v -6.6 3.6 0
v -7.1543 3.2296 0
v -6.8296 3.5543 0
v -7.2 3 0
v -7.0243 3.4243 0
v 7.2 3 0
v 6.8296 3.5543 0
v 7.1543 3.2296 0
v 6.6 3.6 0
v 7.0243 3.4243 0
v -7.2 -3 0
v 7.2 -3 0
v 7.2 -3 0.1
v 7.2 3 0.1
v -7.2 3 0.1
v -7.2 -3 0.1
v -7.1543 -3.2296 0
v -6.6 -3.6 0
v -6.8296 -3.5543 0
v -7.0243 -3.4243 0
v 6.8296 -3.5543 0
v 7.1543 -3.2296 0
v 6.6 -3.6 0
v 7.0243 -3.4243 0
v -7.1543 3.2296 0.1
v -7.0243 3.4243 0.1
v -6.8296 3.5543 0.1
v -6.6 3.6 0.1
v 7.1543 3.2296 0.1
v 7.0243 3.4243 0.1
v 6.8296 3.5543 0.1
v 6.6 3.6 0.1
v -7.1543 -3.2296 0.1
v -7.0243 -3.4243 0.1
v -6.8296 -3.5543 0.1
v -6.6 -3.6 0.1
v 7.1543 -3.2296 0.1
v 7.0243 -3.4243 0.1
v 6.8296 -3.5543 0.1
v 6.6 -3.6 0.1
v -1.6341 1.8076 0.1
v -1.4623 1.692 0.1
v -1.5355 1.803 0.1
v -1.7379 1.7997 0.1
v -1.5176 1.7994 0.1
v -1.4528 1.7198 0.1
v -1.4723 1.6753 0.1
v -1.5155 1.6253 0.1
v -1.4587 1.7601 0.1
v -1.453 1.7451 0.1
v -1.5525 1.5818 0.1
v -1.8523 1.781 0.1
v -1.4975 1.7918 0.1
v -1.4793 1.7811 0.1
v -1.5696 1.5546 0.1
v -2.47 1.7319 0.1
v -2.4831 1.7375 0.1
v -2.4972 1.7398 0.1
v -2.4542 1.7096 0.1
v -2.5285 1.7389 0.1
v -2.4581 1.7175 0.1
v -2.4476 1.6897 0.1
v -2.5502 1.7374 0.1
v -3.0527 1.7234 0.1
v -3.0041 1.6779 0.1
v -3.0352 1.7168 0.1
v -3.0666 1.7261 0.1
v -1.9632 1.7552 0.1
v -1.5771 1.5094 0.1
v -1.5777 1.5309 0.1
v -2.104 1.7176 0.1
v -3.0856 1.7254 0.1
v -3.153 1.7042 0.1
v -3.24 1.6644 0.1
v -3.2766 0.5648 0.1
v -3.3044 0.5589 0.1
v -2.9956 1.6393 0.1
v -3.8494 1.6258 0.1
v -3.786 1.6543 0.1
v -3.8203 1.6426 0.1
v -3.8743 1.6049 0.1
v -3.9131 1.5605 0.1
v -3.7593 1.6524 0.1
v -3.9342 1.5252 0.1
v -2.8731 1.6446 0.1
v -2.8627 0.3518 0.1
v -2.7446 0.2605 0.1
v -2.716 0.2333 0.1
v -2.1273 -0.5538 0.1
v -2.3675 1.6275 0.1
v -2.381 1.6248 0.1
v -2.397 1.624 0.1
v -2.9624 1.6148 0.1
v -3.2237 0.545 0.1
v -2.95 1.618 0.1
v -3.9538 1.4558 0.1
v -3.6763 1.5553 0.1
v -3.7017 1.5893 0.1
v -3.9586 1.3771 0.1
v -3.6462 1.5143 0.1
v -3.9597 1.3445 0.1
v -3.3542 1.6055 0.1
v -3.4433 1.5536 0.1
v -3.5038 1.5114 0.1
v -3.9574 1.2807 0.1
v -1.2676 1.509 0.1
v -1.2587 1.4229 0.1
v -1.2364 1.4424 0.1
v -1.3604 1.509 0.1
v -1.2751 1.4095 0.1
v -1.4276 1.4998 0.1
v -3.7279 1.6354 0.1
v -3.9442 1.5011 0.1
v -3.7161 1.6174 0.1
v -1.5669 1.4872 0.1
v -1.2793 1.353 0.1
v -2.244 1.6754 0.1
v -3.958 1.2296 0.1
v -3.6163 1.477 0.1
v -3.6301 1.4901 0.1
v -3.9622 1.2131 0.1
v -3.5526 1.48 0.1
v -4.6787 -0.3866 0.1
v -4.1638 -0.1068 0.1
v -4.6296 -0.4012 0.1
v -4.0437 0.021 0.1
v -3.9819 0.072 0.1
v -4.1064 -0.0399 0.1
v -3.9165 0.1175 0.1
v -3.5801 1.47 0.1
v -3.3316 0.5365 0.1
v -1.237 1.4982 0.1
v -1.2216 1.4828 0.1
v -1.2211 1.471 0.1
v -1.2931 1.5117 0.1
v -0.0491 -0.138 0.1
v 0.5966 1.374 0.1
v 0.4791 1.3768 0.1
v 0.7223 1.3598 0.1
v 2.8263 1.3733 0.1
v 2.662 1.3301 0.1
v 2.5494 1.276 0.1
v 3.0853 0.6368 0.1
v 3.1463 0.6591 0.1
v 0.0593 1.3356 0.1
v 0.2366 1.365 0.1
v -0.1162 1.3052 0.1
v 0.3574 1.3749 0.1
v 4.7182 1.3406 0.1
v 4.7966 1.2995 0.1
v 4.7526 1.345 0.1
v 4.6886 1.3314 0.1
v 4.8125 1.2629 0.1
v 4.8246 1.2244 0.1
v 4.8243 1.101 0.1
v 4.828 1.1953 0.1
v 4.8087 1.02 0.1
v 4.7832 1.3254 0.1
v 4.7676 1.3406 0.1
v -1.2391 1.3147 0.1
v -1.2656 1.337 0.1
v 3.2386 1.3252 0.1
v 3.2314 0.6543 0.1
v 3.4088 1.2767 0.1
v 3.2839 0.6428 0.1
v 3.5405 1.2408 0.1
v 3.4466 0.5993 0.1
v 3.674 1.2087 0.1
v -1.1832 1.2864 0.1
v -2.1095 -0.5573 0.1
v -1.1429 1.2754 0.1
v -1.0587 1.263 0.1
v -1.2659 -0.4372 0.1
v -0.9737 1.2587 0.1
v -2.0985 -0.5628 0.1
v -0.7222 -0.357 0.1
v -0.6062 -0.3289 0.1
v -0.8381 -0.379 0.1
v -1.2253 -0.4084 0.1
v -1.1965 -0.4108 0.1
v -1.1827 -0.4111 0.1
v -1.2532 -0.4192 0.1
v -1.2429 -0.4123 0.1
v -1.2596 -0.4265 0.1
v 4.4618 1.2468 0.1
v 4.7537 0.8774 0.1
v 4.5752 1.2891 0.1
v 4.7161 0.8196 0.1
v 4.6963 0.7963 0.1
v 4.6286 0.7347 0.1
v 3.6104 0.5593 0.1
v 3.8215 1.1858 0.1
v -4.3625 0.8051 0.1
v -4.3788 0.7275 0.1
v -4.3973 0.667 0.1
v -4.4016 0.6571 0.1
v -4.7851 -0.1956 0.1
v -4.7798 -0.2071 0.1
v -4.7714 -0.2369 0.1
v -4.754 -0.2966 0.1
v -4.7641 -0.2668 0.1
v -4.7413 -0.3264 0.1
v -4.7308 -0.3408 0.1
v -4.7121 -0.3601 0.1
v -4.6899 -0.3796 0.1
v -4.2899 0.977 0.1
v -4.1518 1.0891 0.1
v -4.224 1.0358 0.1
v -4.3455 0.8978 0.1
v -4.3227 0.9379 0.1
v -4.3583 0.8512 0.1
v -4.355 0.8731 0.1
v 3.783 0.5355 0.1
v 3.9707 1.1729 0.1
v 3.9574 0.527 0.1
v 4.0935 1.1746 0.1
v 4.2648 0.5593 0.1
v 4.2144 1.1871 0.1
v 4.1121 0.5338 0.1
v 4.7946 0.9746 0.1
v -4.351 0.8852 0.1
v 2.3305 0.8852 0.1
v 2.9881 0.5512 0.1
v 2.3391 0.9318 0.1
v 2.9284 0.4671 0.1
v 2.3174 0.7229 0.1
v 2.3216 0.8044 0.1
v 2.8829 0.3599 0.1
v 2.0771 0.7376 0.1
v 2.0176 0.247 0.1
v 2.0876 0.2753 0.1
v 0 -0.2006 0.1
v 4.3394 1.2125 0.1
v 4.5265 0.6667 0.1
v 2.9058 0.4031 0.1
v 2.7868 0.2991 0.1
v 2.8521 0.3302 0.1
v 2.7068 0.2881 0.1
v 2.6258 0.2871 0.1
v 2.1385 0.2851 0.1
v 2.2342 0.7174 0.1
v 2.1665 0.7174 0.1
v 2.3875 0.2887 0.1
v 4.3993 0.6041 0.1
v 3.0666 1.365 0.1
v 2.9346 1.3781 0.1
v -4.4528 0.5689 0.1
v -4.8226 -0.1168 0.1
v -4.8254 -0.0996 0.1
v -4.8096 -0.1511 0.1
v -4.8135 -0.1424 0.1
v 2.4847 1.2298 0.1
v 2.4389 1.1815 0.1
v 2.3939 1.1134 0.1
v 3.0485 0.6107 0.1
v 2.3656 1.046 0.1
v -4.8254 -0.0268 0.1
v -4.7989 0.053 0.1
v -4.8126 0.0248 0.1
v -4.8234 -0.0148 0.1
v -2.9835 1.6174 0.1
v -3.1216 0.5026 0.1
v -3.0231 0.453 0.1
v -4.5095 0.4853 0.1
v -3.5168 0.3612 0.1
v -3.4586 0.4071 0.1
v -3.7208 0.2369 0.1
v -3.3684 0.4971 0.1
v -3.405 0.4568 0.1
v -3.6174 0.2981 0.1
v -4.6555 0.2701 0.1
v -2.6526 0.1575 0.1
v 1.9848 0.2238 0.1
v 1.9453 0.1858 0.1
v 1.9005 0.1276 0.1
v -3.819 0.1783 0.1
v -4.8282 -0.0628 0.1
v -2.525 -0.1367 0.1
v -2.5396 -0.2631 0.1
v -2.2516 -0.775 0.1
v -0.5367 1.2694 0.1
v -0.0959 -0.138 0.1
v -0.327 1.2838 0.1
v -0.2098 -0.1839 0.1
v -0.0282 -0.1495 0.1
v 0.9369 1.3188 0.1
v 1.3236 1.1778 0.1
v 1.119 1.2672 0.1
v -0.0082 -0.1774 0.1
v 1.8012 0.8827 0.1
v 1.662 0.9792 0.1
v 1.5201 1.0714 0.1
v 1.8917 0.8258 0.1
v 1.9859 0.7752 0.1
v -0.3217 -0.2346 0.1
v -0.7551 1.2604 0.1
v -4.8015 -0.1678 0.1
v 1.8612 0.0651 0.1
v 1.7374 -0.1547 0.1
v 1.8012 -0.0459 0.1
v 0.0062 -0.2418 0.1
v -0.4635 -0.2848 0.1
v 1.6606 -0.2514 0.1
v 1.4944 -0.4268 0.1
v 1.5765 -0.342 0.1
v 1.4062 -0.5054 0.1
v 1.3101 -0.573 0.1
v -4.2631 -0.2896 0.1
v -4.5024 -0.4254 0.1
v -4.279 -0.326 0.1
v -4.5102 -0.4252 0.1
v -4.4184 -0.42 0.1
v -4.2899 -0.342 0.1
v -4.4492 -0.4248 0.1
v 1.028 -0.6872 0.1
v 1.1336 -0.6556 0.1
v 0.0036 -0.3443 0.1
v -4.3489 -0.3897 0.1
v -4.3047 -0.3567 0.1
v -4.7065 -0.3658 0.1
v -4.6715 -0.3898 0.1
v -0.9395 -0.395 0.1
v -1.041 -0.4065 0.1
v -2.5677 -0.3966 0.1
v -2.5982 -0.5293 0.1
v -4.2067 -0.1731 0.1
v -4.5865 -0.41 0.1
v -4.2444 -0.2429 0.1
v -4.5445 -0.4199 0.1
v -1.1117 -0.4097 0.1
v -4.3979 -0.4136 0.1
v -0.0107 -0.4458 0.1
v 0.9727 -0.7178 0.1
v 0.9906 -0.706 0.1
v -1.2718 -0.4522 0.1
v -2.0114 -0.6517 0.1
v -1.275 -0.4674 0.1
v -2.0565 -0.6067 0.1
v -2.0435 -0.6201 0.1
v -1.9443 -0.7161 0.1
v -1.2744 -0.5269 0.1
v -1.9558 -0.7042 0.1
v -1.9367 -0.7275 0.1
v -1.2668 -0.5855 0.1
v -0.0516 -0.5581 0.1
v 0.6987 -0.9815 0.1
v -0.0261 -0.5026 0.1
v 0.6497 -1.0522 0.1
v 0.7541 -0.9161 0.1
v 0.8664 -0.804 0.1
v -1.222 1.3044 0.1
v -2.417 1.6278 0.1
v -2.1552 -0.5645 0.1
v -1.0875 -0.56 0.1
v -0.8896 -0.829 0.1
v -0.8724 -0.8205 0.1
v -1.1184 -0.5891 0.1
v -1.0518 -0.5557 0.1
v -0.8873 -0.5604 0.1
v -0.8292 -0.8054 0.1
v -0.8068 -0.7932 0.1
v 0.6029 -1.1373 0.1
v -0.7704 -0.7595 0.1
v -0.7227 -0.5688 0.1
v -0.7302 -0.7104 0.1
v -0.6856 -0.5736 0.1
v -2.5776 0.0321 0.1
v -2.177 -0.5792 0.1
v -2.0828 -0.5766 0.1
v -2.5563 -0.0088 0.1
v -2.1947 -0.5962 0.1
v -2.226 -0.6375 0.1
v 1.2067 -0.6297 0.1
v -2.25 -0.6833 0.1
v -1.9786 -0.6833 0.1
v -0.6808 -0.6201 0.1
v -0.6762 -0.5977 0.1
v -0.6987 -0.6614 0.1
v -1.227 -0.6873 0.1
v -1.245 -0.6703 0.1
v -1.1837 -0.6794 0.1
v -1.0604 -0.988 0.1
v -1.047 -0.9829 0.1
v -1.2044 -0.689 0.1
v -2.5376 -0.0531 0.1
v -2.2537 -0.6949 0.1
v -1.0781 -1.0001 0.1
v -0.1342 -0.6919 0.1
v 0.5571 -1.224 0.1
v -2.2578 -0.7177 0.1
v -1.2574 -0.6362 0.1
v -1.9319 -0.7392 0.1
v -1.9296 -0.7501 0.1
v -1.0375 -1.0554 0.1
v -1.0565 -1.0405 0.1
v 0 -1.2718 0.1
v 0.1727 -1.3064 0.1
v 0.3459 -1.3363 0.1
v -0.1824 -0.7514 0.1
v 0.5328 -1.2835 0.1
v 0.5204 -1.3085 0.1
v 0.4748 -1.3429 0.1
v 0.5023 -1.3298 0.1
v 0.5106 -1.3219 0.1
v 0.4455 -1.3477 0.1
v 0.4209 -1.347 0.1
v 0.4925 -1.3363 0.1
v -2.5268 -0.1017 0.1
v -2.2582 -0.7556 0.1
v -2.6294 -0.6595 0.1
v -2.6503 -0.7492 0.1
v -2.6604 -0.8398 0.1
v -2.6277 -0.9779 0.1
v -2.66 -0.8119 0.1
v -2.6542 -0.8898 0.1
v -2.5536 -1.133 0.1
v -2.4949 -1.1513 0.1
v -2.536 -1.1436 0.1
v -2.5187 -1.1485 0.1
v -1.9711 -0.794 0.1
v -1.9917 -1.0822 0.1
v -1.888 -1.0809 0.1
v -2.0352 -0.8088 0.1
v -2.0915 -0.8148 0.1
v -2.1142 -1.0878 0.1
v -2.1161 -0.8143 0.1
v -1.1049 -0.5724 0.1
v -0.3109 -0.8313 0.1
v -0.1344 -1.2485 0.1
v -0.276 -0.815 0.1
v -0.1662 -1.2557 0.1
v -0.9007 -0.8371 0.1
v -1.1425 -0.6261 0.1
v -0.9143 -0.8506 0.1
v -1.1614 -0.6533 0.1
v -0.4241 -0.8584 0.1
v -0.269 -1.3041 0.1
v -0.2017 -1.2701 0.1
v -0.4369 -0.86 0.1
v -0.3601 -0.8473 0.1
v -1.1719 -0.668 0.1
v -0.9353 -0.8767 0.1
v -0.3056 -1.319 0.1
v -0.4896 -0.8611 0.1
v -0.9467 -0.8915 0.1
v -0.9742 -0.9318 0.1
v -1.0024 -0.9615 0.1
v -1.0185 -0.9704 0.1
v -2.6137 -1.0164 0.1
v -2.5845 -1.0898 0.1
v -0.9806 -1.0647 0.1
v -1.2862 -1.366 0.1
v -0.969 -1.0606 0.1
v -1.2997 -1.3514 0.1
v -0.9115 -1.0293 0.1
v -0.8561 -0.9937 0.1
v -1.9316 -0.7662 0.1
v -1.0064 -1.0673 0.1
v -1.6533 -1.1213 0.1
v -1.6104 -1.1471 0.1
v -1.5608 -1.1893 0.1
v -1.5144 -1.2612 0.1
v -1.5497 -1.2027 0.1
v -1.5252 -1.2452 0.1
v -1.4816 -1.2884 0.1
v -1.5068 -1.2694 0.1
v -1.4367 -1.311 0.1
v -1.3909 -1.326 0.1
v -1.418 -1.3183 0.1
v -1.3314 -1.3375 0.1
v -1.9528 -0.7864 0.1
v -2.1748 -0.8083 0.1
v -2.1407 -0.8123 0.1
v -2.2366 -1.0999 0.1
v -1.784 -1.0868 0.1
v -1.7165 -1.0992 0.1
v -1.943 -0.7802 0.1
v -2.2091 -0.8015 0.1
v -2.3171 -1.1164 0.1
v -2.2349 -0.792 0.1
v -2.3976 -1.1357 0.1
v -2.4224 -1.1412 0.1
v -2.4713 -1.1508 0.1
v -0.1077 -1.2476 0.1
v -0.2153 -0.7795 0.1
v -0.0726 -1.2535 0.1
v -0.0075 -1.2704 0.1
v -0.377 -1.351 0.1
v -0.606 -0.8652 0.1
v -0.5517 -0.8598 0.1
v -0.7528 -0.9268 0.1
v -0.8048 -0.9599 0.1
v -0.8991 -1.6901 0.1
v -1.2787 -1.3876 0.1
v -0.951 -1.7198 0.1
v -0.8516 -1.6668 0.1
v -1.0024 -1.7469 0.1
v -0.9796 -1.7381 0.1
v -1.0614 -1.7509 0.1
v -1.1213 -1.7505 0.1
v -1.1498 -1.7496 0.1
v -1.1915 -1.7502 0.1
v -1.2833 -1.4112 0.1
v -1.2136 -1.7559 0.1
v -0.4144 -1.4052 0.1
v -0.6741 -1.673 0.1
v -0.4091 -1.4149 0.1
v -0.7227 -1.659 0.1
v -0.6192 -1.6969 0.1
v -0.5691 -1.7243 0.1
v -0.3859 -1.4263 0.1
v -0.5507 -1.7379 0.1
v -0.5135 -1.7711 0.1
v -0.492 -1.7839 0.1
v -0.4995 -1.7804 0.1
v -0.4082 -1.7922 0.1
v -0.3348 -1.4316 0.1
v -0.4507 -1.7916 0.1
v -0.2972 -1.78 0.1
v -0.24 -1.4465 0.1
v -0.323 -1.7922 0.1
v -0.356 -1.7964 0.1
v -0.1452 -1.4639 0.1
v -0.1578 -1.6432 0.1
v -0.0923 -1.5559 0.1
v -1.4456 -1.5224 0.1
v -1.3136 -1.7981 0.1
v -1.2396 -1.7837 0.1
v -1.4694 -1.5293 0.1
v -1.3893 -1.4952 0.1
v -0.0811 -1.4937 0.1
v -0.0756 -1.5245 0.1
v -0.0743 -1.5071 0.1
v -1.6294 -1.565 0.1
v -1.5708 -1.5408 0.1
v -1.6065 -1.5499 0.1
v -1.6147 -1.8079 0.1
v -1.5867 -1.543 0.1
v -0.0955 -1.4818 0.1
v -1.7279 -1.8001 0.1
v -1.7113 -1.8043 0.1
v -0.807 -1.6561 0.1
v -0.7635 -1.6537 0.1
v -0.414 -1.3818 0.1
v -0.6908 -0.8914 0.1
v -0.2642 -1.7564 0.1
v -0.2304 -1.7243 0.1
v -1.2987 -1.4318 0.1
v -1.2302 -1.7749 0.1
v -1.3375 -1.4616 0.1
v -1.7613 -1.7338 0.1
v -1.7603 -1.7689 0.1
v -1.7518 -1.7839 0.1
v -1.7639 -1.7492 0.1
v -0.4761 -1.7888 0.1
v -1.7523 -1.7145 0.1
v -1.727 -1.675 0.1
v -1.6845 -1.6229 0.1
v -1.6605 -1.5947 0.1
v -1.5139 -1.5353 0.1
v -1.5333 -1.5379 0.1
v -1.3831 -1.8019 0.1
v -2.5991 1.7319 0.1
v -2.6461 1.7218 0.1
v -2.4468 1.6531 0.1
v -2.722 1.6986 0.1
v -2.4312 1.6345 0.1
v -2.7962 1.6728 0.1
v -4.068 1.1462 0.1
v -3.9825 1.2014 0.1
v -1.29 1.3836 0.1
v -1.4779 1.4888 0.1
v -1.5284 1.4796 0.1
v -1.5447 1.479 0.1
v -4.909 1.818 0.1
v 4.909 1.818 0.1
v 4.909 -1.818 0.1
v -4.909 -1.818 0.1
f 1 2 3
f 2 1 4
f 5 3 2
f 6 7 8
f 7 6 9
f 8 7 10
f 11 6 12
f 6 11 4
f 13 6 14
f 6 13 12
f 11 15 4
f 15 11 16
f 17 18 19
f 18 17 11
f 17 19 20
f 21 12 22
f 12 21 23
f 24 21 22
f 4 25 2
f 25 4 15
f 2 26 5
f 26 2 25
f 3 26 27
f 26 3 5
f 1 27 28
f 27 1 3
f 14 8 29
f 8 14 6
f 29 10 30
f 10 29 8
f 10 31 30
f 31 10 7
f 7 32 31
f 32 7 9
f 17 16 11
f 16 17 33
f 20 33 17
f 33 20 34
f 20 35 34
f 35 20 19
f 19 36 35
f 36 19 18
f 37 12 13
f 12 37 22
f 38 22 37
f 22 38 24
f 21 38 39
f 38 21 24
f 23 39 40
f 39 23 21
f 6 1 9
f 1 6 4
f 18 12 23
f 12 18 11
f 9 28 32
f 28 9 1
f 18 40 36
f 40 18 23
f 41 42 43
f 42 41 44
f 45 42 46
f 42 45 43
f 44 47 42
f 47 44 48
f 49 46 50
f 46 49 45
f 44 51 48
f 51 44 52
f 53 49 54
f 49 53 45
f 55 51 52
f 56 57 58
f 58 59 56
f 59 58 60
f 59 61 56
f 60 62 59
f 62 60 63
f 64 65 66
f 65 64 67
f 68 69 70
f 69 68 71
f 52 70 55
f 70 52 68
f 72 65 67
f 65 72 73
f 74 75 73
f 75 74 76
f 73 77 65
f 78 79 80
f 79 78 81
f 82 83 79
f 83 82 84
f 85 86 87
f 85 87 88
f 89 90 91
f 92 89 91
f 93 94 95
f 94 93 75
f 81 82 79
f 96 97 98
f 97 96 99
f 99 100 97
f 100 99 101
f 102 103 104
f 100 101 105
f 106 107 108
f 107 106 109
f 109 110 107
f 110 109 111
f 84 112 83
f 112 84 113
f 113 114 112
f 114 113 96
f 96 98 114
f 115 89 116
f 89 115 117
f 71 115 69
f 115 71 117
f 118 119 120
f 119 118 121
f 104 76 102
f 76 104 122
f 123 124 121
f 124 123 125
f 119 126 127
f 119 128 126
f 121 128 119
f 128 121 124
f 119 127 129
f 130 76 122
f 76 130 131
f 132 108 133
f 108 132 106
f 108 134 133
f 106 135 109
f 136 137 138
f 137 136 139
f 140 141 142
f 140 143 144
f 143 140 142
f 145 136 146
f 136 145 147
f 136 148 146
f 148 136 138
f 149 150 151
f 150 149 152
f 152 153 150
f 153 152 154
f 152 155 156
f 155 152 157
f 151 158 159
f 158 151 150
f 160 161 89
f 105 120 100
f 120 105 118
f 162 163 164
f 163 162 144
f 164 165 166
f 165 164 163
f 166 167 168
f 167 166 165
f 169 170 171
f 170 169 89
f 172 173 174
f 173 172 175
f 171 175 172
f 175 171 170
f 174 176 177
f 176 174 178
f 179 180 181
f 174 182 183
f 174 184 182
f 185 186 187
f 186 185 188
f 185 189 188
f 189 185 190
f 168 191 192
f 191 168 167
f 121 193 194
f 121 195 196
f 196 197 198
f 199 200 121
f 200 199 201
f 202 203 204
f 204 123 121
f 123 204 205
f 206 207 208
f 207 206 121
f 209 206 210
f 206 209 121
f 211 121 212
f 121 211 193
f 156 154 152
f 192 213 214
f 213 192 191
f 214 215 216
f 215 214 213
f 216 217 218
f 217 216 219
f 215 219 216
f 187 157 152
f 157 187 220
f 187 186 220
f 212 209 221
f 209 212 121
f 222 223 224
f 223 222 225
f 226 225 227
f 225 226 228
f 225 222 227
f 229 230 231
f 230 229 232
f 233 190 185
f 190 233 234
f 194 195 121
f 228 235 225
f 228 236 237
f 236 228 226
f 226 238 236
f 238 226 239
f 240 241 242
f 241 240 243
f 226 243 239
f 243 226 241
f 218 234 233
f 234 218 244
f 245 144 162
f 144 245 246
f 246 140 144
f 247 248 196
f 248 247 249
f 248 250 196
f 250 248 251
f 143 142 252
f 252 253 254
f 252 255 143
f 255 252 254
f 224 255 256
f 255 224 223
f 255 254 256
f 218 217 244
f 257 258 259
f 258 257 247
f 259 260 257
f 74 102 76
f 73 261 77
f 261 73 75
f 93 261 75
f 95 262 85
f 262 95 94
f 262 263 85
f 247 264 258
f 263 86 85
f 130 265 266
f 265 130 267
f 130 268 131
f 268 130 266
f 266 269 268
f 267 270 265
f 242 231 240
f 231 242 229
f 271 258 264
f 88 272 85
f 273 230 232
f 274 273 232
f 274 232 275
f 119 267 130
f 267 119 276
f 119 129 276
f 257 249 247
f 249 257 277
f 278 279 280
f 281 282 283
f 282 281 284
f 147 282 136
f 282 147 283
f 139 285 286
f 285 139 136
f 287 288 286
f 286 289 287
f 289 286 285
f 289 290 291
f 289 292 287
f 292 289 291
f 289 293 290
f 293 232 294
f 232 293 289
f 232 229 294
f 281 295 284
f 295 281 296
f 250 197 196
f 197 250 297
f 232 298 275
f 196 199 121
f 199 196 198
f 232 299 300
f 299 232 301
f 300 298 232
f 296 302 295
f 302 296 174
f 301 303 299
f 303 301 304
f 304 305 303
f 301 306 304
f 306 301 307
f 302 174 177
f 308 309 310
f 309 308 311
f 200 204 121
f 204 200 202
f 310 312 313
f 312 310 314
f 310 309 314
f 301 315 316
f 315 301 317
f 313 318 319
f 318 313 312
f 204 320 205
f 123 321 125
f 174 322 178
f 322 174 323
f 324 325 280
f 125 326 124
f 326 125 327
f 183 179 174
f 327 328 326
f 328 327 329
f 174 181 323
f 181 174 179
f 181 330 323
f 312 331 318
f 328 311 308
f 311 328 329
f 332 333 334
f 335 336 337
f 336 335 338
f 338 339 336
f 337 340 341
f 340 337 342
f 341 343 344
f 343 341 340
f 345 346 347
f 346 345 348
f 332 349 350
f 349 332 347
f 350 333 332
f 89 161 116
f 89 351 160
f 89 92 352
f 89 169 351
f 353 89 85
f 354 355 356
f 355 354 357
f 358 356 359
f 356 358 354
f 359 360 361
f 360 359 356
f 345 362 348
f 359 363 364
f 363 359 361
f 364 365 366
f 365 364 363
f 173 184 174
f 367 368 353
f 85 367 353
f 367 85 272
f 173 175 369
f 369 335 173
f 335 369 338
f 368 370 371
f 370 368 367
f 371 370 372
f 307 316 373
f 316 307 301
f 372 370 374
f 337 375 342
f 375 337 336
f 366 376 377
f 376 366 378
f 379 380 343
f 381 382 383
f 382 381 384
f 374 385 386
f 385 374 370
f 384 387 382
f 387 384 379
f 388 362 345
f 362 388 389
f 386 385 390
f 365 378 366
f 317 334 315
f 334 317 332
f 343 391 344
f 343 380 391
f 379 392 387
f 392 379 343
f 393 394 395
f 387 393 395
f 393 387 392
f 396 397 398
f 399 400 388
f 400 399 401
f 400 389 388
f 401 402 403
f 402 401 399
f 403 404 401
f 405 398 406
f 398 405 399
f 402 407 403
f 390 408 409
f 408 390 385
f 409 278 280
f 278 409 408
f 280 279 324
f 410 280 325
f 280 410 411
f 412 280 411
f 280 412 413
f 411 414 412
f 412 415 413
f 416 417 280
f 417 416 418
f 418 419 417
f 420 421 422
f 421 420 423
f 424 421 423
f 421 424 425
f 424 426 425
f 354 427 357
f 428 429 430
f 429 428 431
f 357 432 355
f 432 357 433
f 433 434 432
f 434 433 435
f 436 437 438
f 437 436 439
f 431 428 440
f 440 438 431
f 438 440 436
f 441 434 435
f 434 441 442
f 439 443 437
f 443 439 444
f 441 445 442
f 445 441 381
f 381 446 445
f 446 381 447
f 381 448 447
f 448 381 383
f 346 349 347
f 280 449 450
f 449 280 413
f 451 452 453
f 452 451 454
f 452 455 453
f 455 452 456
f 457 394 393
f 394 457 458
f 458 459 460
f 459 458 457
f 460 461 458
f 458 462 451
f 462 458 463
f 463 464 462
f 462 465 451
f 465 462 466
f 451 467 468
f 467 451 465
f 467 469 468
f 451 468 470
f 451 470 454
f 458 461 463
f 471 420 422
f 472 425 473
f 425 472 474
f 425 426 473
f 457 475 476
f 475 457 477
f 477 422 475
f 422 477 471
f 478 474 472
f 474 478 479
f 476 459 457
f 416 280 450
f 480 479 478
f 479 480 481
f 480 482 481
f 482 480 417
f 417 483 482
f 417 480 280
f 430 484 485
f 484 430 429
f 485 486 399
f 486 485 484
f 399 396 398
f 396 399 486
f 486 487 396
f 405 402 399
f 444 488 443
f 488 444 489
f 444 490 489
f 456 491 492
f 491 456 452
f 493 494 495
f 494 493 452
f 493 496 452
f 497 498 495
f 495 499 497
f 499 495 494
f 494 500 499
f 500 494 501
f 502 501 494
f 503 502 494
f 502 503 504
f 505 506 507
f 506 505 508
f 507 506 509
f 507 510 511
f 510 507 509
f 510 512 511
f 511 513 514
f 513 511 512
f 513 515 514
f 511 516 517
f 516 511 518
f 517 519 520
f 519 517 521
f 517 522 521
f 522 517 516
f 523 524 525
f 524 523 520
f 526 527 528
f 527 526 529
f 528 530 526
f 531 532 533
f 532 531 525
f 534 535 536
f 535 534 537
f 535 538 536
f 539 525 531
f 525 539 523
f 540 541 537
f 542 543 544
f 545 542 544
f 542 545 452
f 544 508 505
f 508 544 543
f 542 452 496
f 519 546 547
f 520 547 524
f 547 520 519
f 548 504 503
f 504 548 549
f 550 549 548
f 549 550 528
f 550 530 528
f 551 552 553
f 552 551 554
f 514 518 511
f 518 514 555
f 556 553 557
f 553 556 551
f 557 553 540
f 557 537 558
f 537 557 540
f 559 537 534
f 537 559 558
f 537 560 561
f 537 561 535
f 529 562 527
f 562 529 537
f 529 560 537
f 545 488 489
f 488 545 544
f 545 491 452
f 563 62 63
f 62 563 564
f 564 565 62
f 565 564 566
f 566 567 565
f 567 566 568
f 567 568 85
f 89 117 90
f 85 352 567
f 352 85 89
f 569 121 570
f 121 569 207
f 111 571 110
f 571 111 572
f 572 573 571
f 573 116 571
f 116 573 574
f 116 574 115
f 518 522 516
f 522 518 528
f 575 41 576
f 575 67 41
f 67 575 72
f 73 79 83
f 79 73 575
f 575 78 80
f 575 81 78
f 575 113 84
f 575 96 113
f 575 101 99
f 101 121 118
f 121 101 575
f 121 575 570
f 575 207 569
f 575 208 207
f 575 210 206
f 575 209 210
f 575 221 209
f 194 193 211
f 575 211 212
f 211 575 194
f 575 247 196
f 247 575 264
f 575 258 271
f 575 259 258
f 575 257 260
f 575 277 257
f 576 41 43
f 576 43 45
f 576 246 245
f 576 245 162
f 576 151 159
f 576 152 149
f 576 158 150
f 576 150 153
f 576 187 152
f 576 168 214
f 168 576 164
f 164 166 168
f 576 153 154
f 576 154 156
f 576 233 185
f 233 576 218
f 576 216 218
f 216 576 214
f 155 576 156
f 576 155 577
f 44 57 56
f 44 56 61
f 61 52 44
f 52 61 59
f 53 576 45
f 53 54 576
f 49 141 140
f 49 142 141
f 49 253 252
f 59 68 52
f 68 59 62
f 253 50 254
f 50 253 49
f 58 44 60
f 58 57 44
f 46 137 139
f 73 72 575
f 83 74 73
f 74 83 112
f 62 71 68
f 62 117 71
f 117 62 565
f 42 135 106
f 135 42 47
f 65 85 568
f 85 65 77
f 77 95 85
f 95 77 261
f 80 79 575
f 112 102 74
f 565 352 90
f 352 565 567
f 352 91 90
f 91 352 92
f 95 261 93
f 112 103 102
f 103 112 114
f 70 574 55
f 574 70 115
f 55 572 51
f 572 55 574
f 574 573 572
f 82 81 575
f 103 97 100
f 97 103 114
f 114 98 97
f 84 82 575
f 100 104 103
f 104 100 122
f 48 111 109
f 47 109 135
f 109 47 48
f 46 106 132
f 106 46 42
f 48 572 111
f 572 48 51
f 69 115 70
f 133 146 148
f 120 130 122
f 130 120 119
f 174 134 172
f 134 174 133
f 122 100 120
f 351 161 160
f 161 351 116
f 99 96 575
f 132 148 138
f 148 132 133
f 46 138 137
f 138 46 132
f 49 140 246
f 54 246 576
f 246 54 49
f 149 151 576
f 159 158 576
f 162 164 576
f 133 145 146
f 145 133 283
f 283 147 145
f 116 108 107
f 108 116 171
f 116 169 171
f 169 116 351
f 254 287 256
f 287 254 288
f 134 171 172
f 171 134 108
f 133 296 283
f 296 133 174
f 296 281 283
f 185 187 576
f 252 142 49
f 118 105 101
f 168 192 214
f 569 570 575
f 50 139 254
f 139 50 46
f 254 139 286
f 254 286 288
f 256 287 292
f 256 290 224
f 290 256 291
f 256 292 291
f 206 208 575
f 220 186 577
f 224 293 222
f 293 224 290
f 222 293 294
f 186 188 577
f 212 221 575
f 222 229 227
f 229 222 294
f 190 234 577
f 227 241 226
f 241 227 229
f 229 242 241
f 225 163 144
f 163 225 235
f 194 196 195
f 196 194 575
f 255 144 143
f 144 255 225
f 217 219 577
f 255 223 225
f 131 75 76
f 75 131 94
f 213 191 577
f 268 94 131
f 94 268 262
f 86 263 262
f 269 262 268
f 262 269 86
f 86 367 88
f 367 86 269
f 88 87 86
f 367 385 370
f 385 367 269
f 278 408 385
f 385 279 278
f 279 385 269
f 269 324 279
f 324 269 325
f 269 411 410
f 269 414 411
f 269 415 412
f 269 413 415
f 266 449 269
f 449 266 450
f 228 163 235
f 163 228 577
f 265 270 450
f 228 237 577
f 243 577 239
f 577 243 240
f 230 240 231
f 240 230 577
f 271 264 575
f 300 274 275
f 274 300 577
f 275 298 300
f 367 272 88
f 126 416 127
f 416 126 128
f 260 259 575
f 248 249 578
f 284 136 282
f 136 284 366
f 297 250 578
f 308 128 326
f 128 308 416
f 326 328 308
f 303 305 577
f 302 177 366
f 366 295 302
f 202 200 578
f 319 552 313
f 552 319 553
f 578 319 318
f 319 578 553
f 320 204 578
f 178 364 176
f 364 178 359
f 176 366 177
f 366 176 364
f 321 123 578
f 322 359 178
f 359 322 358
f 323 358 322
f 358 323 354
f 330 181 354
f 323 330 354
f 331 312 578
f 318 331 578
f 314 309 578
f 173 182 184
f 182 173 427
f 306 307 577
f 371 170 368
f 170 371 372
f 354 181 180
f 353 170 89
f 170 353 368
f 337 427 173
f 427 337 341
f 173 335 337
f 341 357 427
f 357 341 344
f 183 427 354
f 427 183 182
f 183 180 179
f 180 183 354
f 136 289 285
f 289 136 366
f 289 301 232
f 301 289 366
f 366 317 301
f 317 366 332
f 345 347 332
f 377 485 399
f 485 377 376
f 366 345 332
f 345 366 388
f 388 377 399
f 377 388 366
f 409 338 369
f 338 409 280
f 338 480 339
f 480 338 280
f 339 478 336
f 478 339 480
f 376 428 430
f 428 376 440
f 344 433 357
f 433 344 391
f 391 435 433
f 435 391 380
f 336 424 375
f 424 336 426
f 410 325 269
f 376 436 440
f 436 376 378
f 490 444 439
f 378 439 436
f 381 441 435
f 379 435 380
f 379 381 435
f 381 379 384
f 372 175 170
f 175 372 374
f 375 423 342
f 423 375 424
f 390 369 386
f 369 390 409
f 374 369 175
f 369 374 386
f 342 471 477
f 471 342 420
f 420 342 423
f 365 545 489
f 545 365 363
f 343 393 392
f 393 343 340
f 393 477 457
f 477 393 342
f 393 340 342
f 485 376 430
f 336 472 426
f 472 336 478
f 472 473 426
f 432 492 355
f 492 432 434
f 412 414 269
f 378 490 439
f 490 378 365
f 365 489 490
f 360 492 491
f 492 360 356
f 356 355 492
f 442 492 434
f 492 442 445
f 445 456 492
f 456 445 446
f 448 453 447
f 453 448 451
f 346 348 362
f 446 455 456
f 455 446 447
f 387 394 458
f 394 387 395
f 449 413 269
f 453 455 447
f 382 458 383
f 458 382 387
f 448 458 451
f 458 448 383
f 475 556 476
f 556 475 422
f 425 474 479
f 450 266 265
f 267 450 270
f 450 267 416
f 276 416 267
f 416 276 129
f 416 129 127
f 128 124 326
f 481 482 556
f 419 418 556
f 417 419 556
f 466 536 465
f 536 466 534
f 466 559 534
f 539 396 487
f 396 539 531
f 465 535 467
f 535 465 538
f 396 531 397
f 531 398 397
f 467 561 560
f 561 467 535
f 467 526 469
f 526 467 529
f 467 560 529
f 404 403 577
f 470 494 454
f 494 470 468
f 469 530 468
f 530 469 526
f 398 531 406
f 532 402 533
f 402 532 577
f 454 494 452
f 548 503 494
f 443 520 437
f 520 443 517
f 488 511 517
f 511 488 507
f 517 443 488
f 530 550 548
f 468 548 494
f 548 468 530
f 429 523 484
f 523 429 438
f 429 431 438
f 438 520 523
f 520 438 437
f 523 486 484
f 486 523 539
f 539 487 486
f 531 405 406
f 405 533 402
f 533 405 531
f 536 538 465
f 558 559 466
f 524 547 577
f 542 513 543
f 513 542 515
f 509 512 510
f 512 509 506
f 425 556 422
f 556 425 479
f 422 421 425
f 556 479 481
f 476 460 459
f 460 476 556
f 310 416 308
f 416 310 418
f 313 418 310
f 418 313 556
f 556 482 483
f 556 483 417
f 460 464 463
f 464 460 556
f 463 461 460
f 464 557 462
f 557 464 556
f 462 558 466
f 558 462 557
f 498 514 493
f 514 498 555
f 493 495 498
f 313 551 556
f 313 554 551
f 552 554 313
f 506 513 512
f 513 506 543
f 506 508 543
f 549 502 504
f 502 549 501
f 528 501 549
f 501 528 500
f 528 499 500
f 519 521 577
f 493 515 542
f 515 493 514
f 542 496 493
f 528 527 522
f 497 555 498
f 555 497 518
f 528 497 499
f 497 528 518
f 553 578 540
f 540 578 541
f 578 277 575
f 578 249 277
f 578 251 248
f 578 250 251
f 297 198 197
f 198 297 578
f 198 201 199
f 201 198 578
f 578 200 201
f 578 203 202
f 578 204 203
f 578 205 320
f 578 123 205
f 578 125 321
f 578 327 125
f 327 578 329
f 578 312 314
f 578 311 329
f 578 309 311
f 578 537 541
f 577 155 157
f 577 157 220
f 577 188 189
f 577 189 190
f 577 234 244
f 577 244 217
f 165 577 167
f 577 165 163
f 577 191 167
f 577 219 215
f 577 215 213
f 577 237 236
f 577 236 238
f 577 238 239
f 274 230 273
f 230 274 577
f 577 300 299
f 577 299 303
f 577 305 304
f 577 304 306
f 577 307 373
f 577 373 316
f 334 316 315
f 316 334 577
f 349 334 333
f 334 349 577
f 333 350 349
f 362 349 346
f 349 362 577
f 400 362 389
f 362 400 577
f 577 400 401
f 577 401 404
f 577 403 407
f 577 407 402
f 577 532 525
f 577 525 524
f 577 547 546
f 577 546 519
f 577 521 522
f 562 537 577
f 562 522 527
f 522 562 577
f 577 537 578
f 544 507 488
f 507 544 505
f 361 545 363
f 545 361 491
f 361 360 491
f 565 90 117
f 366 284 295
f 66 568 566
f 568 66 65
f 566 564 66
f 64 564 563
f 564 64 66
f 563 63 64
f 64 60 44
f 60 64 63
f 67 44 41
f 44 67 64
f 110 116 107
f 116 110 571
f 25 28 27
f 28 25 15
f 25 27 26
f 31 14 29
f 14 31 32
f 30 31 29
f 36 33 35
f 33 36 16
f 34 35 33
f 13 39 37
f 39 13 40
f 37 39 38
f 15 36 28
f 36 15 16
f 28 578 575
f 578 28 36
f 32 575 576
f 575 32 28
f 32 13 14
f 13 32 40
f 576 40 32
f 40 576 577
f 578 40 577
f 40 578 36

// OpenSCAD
use <../lib.scad>
use <../p/1-4chrd.scad>
use <../p/logo-ford-mustang-outerbox.scad>
use <../p/logo-ford-mustang.scad>
use <s/stickerback009x018.scad>
function ldraw_lib__6218741g() = [
// 0 Sticker  0.9 x  1.8 with Silver Mustang Logo on Black Background
// 0 Name: 6218741g.dat
// 0 Author: Massimo Maso [Sirio]
// 0 !LDRAW_ORG Part UPDATE 2026-08
// 0 !LICENSE Licensed under CC BY 4.0 : see CAreadme.txt
// 
// 0 BFC CERTIFY CCW
  [0,"BFC","CERTIFY"],
  [0,"BFC","CCW"],
// 
// 0 !CATEGORY Sticker
// 0 !KEYWORDS 1968, BrickLink 75884stk01, Brickowl 37251, Fastback, Ford, Mustang
// 0 !KEYWORDS Rebrickable 37571, Set 75884, Speed Champions
// 
// 0 !HISTORY 2026-08-31 [OrionP] Official Update 2026-08
// 
// 0 // Stickerback
// 1 16 0 0 0 1 0 0 0 1 0 0 0 1 s\stickerback009x018.dat
  [1,16,0,0,0,1,0,0,0,1,0,0,0,1, ldraw_lib__s__stickerback009x018()],
// 0 // Logo primitives
// 1 80 0 -.25 0 3.6 0 0 0 1 0 0 0 3.6 logo-ford-mustang.dat
  [1,80,0,-.25,0,3.6,0,0,0,1,0,0,0,3.6, ldraw_lib__logo_ford_mustang()],
// 1 0 0 -.25 0 3.6 0 0 0 1 0 0 0 3.6 logo-ford-mustang-outerbox.dat
  [1,0,0,-.25,0,3.6,0,0,0,1,0,0,0,3.6, ldraw_lib__logo_ford_mustang_outerbox()],
// 0 // Primitives
// 1 0 -16.5 -.25 7.5 -1.5 0 0 0 1 0 0 0 1.5 1-4chrd.dat
  [1,0,-16.5,-.25,7.5,-1.5,0,0,0,1,0,0,0,1.5, ldraw_lib__1_4chrd()],
// 1 0 16.5 -.25 7.5 1.5 0 0 0 1 0 0 0 1.5 1-4chrd.dat
  [1,0,16.5,-.25,7.5,1.5,0,0,0,1,0,0,0,1.5, ldraw_lib__1_4chrd()],
// 1 0 -16.5 -.25 -7.5 -1.5 0 0 0 1 0 0 0 -1.5 1-4chrd.dat
  [1,0,-16.5,-.25,-7.5,-1.5,0,0,0,1,0,0,0,-1.5, ldraw_lib__1_4chrd()],
// 1 0 16.5 -.25 -7.5 1.5 0 0 0 1 0 0 0 -1.5 1-4chrd.dat
  [1,0,16.5,-.25,-7.5,1.5,0,0,0,1,0,0,0,-1.5, ldraw_lib__1_4chrd()],
// 0 // Top face
// 0 // Black faces
// 4 0 -16.5 -.25 9 -18 -.25 7.5 -18 -.25 -7.5 -16.5 -.25 -9
  [4,0,-16.5,-.25,9,-18,-.25,7.5,-18,-.25,-7.5,-16.5,-.25,-9],
// 4 0 -16.5 -.25 9 -16.5 -.25 -9 -12.2724 -.25 -4.545 -12.2724 -.25 4.545
  [4,0,-16.5,-.25,9,-16.5,-.25,-9,-12.2724,-.25,-4.545,-12.2724,-.25,4.545],
// 4 0 -16.5 -.25 9 -12.2724 -.25 4.545 12.2724 -.25 4.545 16.5 -.25 9
  [4,0,-16.5,-.25,9,-12.2724,-.25,4.545,12.2724,-.25,4.545,16.5,-.25,9],
// 4 0 16.5 -.25 -9 18 -.25 -7.5 18 -.25 7.5 16.5 -.25 9
  [4,0,16.5,-.25,-9,18,-.25,-7.5,18,-.25,7.5,16.5,-.25,9],
// 4 0 16.5 -.25 -9 16.5 -.25 9 12.2724 -.25 4.545 12.2724 -.25 -4.545
  [4,0,16.5,-.25,-9,16.5,-.25,9,12.2724,-.25,4.545,12.2724,-.25,-4.545],
// 4 0 16.5 -.25 -9 12.2724 -.25 -4.545 -12.2724 -.25 -4.545 -16.5 -.25 -9
  [4,0,16.5,-.25,-9,12.2724,-.25,-4.545,-12.2724,-.25,-4.545,-16.5,-.25,-9],
];
module ldraw_lib__6218741g(step=0, col=false, unit=2/5, alt=false, line=0.2, solid=!$preview)
    makepoly(ldraw_lib__6218741g(), step=step, col=col, unit=unit, alt=alt, line=line, solid=solid);
ldraw_lib__6218741g(line=0.2);
